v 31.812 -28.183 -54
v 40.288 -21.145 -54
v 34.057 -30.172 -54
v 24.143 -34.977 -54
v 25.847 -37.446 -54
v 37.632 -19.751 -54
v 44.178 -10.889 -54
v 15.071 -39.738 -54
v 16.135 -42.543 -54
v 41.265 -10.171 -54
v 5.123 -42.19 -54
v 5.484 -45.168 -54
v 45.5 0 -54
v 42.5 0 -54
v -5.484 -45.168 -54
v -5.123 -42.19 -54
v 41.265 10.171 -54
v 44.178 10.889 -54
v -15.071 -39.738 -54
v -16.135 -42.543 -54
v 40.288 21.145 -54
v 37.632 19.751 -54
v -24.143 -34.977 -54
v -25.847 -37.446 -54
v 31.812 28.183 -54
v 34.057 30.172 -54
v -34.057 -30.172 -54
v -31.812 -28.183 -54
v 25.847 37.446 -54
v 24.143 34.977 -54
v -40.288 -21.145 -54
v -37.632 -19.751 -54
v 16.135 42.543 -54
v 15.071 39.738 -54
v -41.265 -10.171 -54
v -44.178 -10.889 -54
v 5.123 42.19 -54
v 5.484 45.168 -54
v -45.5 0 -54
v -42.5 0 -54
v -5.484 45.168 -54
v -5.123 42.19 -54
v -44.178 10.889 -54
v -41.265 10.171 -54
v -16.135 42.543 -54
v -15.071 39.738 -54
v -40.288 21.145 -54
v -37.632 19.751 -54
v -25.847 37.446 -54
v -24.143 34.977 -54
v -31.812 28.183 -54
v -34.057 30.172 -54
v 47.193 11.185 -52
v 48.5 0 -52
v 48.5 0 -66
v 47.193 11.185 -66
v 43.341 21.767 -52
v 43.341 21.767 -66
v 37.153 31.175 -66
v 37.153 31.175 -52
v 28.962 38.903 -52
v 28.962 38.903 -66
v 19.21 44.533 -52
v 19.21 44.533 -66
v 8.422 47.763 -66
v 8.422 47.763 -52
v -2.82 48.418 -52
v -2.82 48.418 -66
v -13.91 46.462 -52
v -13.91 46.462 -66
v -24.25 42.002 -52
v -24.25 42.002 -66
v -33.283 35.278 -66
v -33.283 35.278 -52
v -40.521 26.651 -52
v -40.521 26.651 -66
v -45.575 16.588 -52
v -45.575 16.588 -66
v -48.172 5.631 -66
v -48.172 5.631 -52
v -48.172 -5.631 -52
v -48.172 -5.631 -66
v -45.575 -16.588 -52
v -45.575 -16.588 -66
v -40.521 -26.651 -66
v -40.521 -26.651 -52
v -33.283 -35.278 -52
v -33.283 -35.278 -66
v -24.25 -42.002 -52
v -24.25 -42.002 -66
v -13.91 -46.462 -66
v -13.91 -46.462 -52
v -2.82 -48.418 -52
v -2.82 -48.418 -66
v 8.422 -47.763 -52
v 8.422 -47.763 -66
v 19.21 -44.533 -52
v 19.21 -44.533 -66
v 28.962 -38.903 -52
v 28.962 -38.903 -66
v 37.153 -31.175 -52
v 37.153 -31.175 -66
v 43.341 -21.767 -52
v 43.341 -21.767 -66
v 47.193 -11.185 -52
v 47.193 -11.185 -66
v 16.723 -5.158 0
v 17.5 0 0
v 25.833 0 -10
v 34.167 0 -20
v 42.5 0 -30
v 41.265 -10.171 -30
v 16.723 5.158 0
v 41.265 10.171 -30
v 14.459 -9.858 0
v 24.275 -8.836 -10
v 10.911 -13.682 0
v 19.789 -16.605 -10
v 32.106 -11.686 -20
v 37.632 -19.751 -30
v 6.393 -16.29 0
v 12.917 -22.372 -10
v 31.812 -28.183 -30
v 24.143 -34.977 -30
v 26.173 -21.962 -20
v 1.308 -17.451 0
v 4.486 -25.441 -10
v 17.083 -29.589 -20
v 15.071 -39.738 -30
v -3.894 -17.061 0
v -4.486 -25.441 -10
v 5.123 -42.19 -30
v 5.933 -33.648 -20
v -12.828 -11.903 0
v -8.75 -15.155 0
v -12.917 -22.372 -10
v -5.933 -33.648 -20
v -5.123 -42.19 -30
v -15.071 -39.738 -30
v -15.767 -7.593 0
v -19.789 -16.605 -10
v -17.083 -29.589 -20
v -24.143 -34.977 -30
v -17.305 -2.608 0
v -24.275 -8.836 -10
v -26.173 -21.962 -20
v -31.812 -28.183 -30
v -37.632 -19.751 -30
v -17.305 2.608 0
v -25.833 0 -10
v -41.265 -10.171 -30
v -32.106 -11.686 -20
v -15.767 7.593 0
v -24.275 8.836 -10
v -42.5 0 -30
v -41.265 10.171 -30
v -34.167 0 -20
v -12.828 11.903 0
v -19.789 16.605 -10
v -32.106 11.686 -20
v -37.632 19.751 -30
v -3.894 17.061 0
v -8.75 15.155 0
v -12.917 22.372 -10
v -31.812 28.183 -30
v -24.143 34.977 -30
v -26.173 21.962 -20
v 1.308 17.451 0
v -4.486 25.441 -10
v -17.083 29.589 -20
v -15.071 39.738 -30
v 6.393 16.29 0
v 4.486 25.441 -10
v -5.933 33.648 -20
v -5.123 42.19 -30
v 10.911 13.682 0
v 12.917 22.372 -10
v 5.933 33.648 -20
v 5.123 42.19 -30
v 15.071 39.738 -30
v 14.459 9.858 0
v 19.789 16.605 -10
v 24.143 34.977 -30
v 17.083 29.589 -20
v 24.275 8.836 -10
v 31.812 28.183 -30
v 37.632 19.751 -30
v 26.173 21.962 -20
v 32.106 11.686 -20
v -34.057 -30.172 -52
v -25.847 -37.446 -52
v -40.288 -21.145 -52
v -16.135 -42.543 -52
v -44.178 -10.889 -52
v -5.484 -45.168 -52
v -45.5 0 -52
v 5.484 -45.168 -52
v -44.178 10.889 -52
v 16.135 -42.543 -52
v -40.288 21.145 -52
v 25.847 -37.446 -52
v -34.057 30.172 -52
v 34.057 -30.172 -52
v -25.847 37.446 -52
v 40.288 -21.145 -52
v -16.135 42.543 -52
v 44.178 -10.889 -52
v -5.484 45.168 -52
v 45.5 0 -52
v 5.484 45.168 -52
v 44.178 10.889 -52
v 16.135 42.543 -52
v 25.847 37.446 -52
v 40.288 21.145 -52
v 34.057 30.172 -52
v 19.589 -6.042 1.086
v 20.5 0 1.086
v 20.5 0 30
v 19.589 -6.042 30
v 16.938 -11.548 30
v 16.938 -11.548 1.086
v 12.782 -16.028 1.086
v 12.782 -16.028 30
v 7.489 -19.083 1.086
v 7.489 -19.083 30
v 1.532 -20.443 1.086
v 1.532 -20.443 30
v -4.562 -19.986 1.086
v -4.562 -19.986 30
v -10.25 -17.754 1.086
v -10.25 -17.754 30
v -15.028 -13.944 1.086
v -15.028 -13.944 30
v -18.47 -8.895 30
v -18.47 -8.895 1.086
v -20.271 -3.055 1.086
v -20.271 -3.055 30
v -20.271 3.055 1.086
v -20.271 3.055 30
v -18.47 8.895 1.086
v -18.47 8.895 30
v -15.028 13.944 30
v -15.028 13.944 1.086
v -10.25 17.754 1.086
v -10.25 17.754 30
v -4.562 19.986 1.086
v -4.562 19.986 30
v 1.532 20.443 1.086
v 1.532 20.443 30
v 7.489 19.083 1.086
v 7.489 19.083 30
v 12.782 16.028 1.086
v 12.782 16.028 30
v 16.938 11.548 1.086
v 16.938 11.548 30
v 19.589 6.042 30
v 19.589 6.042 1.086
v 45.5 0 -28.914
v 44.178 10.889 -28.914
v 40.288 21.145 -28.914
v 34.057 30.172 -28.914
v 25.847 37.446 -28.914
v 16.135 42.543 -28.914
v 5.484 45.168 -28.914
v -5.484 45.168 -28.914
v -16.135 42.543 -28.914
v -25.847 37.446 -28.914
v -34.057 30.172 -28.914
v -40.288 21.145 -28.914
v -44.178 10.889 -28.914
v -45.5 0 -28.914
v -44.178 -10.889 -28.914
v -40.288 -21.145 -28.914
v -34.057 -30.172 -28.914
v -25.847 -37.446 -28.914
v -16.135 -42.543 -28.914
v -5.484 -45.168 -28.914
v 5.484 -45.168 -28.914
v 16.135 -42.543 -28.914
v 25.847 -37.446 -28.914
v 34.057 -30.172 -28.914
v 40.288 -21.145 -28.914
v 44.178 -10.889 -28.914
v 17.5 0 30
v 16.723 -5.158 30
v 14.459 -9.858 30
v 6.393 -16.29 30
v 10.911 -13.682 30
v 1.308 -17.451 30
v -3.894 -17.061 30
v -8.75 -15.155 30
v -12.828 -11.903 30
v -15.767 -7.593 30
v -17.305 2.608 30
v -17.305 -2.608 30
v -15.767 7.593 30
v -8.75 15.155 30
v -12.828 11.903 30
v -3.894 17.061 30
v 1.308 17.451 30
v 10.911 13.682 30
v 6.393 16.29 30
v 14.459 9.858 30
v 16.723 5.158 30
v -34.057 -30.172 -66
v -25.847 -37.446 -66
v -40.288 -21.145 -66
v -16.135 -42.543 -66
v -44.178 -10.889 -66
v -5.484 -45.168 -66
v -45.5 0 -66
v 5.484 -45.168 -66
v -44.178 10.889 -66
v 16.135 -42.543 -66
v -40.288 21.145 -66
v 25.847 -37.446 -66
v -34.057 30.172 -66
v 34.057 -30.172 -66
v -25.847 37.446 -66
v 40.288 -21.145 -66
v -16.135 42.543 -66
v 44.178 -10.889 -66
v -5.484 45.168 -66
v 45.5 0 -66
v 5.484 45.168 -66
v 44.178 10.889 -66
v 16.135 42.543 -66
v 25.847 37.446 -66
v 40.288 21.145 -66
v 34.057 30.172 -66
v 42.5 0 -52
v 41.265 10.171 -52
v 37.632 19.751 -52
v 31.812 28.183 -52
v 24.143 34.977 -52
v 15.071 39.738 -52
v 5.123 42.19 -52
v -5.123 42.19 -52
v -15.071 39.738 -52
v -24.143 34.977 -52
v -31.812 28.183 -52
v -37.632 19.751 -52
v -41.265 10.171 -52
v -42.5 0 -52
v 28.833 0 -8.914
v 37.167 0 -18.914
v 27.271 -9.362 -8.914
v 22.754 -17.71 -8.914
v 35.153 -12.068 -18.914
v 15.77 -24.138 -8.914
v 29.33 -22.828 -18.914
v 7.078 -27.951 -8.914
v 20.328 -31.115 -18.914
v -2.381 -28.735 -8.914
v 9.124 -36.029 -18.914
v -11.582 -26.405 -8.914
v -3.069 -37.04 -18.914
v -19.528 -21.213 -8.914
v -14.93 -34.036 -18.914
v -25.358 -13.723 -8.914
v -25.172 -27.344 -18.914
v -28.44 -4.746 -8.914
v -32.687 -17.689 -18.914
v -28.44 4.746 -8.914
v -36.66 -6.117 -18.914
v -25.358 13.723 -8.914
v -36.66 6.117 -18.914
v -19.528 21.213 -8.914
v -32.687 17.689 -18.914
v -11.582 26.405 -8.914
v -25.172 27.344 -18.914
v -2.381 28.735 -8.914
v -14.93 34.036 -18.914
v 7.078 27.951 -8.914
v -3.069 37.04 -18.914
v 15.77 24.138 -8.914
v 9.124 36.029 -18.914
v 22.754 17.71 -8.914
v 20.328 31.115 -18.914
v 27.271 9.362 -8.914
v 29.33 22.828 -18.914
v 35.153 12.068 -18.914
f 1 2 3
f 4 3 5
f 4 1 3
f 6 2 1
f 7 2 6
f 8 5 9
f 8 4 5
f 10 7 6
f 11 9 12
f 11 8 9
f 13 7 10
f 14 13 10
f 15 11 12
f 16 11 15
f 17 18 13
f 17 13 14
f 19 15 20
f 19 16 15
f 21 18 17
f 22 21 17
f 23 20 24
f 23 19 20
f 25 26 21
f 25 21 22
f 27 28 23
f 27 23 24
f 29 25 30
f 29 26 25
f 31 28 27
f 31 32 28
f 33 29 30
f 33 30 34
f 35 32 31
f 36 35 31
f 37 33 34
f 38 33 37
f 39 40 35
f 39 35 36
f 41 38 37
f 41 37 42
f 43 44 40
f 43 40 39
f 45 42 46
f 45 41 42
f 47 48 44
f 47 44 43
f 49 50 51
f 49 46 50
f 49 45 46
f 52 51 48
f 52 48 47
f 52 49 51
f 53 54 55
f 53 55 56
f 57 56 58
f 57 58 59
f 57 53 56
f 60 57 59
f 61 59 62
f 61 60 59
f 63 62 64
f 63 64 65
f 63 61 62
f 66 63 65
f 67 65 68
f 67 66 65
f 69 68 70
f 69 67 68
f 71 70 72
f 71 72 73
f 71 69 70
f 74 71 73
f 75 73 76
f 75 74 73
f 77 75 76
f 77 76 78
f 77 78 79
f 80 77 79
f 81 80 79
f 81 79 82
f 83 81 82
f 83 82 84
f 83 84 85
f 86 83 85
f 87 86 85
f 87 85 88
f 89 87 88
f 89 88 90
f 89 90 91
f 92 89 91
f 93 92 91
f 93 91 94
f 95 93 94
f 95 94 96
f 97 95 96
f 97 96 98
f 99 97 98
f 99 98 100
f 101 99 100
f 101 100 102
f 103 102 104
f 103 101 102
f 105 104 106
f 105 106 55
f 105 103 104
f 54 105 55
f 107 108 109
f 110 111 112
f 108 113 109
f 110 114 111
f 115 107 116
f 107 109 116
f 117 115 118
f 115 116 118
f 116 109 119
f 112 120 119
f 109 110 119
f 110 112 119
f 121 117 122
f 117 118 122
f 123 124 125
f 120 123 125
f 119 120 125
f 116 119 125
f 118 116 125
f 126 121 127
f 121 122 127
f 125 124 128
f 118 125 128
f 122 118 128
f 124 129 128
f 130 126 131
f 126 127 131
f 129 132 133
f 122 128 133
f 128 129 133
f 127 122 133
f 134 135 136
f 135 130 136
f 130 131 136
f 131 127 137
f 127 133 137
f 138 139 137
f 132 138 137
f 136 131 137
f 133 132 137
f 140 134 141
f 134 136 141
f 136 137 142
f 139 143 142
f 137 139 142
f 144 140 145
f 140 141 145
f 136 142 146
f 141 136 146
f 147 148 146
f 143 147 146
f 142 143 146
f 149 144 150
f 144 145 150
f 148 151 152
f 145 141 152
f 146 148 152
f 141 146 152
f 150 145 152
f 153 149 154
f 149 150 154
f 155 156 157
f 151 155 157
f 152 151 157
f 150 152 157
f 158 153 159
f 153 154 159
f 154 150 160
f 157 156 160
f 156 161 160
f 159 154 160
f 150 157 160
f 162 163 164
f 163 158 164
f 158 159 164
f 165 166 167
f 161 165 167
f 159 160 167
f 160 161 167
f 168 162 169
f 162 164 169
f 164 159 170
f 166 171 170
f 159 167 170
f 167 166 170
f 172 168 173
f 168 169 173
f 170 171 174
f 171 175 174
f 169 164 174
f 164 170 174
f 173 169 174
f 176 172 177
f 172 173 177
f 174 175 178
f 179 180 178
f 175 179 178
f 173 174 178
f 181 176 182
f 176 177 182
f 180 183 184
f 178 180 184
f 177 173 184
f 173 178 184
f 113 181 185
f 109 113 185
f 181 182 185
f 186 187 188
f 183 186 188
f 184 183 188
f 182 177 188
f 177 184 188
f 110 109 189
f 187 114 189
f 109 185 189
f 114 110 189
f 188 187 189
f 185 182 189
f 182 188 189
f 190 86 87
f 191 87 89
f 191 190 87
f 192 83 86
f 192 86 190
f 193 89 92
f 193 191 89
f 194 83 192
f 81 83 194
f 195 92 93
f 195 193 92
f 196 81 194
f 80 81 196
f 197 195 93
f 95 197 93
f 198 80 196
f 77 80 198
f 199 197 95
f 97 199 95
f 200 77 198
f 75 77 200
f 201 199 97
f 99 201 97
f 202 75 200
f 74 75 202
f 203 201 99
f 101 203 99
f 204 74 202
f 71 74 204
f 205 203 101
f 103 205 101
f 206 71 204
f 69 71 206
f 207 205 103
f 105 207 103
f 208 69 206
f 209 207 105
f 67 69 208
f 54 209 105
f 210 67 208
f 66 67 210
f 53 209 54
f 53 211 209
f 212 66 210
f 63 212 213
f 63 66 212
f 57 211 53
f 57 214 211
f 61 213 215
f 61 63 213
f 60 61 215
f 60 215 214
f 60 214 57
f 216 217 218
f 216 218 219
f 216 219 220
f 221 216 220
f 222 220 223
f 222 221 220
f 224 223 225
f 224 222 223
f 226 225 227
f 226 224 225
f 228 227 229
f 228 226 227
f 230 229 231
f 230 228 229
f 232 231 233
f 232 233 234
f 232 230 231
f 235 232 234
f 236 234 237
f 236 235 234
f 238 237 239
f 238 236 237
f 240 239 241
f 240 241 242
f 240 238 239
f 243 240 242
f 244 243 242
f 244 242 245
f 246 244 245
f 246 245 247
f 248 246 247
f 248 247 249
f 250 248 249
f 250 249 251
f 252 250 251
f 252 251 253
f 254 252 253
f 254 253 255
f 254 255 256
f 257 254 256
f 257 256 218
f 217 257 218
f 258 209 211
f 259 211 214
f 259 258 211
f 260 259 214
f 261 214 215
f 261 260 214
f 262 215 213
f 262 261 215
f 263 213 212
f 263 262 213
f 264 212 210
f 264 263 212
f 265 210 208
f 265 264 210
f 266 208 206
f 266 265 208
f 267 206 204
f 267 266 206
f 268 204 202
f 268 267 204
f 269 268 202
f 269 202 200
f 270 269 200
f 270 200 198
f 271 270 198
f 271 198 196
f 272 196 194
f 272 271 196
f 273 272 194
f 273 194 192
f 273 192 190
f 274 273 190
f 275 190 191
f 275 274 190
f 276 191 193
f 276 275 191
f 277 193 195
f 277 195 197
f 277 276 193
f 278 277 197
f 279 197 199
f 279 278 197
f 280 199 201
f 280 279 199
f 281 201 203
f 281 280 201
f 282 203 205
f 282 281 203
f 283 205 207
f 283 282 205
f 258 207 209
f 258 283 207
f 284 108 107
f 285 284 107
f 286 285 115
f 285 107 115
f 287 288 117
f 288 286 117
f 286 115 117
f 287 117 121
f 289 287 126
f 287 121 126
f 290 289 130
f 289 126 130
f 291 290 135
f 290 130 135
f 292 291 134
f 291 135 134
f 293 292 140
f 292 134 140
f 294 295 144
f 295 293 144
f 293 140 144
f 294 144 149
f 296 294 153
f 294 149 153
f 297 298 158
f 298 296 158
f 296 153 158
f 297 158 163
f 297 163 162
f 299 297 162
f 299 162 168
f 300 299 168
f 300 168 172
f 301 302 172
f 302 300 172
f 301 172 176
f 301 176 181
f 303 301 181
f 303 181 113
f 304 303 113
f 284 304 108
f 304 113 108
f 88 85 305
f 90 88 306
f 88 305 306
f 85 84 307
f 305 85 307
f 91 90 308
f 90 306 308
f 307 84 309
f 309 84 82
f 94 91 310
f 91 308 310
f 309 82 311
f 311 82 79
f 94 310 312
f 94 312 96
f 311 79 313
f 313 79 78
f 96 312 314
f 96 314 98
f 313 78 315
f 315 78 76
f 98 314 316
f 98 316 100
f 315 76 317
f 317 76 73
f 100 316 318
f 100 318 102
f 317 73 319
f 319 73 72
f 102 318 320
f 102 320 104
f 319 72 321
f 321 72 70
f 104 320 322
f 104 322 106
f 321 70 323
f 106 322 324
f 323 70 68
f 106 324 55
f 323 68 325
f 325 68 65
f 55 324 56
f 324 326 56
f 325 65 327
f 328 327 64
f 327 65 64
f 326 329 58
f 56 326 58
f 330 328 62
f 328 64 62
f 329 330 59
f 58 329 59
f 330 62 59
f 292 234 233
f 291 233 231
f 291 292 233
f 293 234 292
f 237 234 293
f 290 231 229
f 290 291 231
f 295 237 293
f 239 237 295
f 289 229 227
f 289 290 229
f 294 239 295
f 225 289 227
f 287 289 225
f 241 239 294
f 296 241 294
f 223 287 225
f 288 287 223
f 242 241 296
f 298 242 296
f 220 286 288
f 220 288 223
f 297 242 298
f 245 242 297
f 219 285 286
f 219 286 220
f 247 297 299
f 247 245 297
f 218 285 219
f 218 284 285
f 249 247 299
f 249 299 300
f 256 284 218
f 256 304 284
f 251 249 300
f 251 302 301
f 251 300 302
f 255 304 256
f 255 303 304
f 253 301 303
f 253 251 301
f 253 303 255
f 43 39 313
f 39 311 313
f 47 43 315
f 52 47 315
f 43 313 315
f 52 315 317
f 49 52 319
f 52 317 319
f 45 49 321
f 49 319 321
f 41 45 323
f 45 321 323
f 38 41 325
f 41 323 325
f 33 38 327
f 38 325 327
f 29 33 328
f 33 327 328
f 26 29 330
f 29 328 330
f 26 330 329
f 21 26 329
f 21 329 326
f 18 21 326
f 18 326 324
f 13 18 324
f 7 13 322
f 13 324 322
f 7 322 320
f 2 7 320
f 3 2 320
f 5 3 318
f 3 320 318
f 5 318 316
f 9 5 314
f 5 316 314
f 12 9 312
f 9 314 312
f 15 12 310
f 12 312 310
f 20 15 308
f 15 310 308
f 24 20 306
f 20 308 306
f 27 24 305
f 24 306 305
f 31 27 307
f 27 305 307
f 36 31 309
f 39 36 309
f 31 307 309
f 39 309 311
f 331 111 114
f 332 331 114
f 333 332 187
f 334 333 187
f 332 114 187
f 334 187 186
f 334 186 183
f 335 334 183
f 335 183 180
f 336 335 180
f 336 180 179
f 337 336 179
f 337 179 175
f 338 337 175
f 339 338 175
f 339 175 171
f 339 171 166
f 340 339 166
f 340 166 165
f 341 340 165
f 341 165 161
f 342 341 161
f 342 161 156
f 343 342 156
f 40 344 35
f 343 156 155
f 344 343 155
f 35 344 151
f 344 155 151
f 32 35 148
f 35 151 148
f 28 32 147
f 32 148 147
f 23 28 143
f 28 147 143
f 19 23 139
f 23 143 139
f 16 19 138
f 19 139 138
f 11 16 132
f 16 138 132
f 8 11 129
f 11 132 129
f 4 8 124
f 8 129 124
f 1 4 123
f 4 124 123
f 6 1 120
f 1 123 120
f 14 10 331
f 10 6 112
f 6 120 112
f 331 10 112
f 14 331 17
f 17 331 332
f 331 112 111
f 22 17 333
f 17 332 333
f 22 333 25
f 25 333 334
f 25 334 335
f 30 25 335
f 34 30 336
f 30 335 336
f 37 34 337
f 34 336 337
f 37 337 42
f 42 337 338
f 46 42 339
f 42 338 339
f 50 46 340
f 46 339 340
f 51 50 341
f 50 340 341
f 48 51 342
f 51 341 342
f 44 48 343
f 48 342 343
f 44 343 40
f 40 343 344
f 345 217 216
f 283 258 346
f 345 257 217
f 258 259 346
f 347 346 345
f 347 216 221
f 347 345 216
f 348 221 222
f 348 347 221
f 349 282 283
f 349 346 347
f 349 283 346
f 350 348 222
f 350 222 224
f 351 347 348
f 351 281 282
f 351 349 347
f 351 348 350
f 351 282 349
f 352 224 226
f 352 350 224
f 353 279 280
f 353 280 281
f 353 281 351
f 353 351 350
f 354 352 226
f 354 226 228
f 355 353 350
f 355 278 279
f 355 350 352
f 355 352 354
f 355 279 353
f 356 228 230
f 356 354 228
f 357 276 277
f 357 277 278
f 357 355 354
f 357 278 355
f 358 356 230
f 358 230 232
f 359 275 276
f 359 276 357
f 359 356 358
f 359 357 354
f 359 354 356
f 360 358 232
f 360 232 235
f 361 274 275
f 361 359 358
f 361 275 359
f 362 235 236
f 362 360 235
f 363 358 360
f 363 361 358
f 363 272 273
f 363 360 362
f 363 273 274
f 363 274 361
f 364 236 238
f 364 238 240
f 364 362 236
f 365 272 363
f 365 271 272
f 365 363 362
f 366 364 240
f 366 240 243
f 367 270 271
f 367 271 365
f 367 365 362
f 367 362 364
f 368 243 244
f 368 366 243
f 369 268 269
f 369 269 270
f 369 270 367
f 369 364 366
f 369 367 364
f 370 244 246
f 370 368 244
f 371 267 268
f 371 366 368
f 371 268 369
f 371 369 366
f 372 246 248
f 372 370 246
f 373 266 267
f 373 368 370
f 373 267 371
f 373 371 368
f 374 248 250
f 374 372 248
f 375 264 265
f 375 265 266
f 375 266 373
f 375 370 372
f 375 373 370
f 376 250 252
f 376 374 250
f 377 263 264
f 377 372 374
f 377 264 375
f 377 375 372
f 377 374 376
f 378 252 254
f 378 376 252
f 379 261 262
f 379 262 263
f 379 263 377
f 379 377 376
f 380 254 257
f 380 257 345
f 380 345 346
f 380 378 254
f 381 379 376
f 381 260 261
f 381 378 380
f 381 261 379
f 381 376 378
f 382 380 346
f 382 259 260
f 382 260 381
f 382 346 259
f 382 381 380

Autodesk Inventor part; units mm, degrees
ref_plane "YZ Plane" through (0, 0, 0) normal (1, 0, 0) x (0, 1, 0)
ref_plane "XZ Plane" through (0, 0, 0) normal (0, 1, 0) x (-1, 0, 0)
sketch "Boceto1" plane through (0, 0, 0) normal (0, 0, 1) x (1, 0, 0)
  arc A0 (11.6645, -103.4622) -> (0, -112.3475) centre (12.4952, -116.6519) ccw construction
  line L0 (-152.4797, 0) -> (132.3175, 0) construction
  line L1 (0, 89.2085) -> (0, -112.3475) construction
  circle A1 centre (0, 0) radius 17.5
  dimension "d0" = 35
extrude "Extrusión1" add sketch "Boceto1" along normal blind 30
ref_plane "Plano de trabajo1" through (0, 0, -30) normal (0, 0, 1) x (1, 0, 0)
sketch "Boceto2" plane through (0, 0, -30) normal (0, 0, 1) x (1, 0, 0)
  circle A0 centre (0, 0) radius 42.5
  dimension "d4" = 85
loft "Solevación1" add profiles "Boceto2" section 2 edges at (-17.5, 0, 0)
ref_plane "Plano de trabajo2" through (0, 0, -55) normal (0, 0, 1) x (1, 0, 0)
sketch "Boceto3" plane through (0, 0, -55) normal (0, 0, 1) x (1, 0, 0)
  circle A0 centre (0, 0) radius 42.5
  dimension "d10" = 85
loft "Solevación2" add profiles "Boceto3" section 2 edges at (-42.5, 0, -30)
shell "Vaciado1" thickness 3 outward yes removed faces 2 at (-10.6049, 7.3037, -55) at (4.865, -5.1831, 30)
ref_plane "Plano de trabajo3" through (0, 0, -52) normal (0, 0, 1) x (1, 0, 0)
sketch "Boceto4" plane through (0, 0, -52) normal (0, 0, 1) x (1, 0, 0)
  circle A0 centre (0, 0) radius 48.5
  dimension "d17" = 97
extrude "Extrusión2" add sketch "Boceto4" against normal blind 14
sketch "Boceto5" plane through (0, 0, -66) normal (0, 0, -1) x (-1, 0, 0)
  circle A0 centre (0, 0) radius 45.5
  dimension "d20" = 91
extrude "Extrusión3" cut sketch "Boceto5" against normal blind 12
sketch "Boceto6" plane through (0, 0, -54) normal (0, 0, -1) x (-1, 0, 0)
  circle A0 centre (0, 0) radius 42.5
  dimension "d23" = 85
extrude "Extrusión4" cut sketch "Boceto6" against normal blind 12
sketch "Boceto7" plane through (0, 0, 30) normal (0, 0, 1) x (1, 0, 0)
  point P0 (0, 0)
properties part number "CAPSULA 2DA MITAD"
